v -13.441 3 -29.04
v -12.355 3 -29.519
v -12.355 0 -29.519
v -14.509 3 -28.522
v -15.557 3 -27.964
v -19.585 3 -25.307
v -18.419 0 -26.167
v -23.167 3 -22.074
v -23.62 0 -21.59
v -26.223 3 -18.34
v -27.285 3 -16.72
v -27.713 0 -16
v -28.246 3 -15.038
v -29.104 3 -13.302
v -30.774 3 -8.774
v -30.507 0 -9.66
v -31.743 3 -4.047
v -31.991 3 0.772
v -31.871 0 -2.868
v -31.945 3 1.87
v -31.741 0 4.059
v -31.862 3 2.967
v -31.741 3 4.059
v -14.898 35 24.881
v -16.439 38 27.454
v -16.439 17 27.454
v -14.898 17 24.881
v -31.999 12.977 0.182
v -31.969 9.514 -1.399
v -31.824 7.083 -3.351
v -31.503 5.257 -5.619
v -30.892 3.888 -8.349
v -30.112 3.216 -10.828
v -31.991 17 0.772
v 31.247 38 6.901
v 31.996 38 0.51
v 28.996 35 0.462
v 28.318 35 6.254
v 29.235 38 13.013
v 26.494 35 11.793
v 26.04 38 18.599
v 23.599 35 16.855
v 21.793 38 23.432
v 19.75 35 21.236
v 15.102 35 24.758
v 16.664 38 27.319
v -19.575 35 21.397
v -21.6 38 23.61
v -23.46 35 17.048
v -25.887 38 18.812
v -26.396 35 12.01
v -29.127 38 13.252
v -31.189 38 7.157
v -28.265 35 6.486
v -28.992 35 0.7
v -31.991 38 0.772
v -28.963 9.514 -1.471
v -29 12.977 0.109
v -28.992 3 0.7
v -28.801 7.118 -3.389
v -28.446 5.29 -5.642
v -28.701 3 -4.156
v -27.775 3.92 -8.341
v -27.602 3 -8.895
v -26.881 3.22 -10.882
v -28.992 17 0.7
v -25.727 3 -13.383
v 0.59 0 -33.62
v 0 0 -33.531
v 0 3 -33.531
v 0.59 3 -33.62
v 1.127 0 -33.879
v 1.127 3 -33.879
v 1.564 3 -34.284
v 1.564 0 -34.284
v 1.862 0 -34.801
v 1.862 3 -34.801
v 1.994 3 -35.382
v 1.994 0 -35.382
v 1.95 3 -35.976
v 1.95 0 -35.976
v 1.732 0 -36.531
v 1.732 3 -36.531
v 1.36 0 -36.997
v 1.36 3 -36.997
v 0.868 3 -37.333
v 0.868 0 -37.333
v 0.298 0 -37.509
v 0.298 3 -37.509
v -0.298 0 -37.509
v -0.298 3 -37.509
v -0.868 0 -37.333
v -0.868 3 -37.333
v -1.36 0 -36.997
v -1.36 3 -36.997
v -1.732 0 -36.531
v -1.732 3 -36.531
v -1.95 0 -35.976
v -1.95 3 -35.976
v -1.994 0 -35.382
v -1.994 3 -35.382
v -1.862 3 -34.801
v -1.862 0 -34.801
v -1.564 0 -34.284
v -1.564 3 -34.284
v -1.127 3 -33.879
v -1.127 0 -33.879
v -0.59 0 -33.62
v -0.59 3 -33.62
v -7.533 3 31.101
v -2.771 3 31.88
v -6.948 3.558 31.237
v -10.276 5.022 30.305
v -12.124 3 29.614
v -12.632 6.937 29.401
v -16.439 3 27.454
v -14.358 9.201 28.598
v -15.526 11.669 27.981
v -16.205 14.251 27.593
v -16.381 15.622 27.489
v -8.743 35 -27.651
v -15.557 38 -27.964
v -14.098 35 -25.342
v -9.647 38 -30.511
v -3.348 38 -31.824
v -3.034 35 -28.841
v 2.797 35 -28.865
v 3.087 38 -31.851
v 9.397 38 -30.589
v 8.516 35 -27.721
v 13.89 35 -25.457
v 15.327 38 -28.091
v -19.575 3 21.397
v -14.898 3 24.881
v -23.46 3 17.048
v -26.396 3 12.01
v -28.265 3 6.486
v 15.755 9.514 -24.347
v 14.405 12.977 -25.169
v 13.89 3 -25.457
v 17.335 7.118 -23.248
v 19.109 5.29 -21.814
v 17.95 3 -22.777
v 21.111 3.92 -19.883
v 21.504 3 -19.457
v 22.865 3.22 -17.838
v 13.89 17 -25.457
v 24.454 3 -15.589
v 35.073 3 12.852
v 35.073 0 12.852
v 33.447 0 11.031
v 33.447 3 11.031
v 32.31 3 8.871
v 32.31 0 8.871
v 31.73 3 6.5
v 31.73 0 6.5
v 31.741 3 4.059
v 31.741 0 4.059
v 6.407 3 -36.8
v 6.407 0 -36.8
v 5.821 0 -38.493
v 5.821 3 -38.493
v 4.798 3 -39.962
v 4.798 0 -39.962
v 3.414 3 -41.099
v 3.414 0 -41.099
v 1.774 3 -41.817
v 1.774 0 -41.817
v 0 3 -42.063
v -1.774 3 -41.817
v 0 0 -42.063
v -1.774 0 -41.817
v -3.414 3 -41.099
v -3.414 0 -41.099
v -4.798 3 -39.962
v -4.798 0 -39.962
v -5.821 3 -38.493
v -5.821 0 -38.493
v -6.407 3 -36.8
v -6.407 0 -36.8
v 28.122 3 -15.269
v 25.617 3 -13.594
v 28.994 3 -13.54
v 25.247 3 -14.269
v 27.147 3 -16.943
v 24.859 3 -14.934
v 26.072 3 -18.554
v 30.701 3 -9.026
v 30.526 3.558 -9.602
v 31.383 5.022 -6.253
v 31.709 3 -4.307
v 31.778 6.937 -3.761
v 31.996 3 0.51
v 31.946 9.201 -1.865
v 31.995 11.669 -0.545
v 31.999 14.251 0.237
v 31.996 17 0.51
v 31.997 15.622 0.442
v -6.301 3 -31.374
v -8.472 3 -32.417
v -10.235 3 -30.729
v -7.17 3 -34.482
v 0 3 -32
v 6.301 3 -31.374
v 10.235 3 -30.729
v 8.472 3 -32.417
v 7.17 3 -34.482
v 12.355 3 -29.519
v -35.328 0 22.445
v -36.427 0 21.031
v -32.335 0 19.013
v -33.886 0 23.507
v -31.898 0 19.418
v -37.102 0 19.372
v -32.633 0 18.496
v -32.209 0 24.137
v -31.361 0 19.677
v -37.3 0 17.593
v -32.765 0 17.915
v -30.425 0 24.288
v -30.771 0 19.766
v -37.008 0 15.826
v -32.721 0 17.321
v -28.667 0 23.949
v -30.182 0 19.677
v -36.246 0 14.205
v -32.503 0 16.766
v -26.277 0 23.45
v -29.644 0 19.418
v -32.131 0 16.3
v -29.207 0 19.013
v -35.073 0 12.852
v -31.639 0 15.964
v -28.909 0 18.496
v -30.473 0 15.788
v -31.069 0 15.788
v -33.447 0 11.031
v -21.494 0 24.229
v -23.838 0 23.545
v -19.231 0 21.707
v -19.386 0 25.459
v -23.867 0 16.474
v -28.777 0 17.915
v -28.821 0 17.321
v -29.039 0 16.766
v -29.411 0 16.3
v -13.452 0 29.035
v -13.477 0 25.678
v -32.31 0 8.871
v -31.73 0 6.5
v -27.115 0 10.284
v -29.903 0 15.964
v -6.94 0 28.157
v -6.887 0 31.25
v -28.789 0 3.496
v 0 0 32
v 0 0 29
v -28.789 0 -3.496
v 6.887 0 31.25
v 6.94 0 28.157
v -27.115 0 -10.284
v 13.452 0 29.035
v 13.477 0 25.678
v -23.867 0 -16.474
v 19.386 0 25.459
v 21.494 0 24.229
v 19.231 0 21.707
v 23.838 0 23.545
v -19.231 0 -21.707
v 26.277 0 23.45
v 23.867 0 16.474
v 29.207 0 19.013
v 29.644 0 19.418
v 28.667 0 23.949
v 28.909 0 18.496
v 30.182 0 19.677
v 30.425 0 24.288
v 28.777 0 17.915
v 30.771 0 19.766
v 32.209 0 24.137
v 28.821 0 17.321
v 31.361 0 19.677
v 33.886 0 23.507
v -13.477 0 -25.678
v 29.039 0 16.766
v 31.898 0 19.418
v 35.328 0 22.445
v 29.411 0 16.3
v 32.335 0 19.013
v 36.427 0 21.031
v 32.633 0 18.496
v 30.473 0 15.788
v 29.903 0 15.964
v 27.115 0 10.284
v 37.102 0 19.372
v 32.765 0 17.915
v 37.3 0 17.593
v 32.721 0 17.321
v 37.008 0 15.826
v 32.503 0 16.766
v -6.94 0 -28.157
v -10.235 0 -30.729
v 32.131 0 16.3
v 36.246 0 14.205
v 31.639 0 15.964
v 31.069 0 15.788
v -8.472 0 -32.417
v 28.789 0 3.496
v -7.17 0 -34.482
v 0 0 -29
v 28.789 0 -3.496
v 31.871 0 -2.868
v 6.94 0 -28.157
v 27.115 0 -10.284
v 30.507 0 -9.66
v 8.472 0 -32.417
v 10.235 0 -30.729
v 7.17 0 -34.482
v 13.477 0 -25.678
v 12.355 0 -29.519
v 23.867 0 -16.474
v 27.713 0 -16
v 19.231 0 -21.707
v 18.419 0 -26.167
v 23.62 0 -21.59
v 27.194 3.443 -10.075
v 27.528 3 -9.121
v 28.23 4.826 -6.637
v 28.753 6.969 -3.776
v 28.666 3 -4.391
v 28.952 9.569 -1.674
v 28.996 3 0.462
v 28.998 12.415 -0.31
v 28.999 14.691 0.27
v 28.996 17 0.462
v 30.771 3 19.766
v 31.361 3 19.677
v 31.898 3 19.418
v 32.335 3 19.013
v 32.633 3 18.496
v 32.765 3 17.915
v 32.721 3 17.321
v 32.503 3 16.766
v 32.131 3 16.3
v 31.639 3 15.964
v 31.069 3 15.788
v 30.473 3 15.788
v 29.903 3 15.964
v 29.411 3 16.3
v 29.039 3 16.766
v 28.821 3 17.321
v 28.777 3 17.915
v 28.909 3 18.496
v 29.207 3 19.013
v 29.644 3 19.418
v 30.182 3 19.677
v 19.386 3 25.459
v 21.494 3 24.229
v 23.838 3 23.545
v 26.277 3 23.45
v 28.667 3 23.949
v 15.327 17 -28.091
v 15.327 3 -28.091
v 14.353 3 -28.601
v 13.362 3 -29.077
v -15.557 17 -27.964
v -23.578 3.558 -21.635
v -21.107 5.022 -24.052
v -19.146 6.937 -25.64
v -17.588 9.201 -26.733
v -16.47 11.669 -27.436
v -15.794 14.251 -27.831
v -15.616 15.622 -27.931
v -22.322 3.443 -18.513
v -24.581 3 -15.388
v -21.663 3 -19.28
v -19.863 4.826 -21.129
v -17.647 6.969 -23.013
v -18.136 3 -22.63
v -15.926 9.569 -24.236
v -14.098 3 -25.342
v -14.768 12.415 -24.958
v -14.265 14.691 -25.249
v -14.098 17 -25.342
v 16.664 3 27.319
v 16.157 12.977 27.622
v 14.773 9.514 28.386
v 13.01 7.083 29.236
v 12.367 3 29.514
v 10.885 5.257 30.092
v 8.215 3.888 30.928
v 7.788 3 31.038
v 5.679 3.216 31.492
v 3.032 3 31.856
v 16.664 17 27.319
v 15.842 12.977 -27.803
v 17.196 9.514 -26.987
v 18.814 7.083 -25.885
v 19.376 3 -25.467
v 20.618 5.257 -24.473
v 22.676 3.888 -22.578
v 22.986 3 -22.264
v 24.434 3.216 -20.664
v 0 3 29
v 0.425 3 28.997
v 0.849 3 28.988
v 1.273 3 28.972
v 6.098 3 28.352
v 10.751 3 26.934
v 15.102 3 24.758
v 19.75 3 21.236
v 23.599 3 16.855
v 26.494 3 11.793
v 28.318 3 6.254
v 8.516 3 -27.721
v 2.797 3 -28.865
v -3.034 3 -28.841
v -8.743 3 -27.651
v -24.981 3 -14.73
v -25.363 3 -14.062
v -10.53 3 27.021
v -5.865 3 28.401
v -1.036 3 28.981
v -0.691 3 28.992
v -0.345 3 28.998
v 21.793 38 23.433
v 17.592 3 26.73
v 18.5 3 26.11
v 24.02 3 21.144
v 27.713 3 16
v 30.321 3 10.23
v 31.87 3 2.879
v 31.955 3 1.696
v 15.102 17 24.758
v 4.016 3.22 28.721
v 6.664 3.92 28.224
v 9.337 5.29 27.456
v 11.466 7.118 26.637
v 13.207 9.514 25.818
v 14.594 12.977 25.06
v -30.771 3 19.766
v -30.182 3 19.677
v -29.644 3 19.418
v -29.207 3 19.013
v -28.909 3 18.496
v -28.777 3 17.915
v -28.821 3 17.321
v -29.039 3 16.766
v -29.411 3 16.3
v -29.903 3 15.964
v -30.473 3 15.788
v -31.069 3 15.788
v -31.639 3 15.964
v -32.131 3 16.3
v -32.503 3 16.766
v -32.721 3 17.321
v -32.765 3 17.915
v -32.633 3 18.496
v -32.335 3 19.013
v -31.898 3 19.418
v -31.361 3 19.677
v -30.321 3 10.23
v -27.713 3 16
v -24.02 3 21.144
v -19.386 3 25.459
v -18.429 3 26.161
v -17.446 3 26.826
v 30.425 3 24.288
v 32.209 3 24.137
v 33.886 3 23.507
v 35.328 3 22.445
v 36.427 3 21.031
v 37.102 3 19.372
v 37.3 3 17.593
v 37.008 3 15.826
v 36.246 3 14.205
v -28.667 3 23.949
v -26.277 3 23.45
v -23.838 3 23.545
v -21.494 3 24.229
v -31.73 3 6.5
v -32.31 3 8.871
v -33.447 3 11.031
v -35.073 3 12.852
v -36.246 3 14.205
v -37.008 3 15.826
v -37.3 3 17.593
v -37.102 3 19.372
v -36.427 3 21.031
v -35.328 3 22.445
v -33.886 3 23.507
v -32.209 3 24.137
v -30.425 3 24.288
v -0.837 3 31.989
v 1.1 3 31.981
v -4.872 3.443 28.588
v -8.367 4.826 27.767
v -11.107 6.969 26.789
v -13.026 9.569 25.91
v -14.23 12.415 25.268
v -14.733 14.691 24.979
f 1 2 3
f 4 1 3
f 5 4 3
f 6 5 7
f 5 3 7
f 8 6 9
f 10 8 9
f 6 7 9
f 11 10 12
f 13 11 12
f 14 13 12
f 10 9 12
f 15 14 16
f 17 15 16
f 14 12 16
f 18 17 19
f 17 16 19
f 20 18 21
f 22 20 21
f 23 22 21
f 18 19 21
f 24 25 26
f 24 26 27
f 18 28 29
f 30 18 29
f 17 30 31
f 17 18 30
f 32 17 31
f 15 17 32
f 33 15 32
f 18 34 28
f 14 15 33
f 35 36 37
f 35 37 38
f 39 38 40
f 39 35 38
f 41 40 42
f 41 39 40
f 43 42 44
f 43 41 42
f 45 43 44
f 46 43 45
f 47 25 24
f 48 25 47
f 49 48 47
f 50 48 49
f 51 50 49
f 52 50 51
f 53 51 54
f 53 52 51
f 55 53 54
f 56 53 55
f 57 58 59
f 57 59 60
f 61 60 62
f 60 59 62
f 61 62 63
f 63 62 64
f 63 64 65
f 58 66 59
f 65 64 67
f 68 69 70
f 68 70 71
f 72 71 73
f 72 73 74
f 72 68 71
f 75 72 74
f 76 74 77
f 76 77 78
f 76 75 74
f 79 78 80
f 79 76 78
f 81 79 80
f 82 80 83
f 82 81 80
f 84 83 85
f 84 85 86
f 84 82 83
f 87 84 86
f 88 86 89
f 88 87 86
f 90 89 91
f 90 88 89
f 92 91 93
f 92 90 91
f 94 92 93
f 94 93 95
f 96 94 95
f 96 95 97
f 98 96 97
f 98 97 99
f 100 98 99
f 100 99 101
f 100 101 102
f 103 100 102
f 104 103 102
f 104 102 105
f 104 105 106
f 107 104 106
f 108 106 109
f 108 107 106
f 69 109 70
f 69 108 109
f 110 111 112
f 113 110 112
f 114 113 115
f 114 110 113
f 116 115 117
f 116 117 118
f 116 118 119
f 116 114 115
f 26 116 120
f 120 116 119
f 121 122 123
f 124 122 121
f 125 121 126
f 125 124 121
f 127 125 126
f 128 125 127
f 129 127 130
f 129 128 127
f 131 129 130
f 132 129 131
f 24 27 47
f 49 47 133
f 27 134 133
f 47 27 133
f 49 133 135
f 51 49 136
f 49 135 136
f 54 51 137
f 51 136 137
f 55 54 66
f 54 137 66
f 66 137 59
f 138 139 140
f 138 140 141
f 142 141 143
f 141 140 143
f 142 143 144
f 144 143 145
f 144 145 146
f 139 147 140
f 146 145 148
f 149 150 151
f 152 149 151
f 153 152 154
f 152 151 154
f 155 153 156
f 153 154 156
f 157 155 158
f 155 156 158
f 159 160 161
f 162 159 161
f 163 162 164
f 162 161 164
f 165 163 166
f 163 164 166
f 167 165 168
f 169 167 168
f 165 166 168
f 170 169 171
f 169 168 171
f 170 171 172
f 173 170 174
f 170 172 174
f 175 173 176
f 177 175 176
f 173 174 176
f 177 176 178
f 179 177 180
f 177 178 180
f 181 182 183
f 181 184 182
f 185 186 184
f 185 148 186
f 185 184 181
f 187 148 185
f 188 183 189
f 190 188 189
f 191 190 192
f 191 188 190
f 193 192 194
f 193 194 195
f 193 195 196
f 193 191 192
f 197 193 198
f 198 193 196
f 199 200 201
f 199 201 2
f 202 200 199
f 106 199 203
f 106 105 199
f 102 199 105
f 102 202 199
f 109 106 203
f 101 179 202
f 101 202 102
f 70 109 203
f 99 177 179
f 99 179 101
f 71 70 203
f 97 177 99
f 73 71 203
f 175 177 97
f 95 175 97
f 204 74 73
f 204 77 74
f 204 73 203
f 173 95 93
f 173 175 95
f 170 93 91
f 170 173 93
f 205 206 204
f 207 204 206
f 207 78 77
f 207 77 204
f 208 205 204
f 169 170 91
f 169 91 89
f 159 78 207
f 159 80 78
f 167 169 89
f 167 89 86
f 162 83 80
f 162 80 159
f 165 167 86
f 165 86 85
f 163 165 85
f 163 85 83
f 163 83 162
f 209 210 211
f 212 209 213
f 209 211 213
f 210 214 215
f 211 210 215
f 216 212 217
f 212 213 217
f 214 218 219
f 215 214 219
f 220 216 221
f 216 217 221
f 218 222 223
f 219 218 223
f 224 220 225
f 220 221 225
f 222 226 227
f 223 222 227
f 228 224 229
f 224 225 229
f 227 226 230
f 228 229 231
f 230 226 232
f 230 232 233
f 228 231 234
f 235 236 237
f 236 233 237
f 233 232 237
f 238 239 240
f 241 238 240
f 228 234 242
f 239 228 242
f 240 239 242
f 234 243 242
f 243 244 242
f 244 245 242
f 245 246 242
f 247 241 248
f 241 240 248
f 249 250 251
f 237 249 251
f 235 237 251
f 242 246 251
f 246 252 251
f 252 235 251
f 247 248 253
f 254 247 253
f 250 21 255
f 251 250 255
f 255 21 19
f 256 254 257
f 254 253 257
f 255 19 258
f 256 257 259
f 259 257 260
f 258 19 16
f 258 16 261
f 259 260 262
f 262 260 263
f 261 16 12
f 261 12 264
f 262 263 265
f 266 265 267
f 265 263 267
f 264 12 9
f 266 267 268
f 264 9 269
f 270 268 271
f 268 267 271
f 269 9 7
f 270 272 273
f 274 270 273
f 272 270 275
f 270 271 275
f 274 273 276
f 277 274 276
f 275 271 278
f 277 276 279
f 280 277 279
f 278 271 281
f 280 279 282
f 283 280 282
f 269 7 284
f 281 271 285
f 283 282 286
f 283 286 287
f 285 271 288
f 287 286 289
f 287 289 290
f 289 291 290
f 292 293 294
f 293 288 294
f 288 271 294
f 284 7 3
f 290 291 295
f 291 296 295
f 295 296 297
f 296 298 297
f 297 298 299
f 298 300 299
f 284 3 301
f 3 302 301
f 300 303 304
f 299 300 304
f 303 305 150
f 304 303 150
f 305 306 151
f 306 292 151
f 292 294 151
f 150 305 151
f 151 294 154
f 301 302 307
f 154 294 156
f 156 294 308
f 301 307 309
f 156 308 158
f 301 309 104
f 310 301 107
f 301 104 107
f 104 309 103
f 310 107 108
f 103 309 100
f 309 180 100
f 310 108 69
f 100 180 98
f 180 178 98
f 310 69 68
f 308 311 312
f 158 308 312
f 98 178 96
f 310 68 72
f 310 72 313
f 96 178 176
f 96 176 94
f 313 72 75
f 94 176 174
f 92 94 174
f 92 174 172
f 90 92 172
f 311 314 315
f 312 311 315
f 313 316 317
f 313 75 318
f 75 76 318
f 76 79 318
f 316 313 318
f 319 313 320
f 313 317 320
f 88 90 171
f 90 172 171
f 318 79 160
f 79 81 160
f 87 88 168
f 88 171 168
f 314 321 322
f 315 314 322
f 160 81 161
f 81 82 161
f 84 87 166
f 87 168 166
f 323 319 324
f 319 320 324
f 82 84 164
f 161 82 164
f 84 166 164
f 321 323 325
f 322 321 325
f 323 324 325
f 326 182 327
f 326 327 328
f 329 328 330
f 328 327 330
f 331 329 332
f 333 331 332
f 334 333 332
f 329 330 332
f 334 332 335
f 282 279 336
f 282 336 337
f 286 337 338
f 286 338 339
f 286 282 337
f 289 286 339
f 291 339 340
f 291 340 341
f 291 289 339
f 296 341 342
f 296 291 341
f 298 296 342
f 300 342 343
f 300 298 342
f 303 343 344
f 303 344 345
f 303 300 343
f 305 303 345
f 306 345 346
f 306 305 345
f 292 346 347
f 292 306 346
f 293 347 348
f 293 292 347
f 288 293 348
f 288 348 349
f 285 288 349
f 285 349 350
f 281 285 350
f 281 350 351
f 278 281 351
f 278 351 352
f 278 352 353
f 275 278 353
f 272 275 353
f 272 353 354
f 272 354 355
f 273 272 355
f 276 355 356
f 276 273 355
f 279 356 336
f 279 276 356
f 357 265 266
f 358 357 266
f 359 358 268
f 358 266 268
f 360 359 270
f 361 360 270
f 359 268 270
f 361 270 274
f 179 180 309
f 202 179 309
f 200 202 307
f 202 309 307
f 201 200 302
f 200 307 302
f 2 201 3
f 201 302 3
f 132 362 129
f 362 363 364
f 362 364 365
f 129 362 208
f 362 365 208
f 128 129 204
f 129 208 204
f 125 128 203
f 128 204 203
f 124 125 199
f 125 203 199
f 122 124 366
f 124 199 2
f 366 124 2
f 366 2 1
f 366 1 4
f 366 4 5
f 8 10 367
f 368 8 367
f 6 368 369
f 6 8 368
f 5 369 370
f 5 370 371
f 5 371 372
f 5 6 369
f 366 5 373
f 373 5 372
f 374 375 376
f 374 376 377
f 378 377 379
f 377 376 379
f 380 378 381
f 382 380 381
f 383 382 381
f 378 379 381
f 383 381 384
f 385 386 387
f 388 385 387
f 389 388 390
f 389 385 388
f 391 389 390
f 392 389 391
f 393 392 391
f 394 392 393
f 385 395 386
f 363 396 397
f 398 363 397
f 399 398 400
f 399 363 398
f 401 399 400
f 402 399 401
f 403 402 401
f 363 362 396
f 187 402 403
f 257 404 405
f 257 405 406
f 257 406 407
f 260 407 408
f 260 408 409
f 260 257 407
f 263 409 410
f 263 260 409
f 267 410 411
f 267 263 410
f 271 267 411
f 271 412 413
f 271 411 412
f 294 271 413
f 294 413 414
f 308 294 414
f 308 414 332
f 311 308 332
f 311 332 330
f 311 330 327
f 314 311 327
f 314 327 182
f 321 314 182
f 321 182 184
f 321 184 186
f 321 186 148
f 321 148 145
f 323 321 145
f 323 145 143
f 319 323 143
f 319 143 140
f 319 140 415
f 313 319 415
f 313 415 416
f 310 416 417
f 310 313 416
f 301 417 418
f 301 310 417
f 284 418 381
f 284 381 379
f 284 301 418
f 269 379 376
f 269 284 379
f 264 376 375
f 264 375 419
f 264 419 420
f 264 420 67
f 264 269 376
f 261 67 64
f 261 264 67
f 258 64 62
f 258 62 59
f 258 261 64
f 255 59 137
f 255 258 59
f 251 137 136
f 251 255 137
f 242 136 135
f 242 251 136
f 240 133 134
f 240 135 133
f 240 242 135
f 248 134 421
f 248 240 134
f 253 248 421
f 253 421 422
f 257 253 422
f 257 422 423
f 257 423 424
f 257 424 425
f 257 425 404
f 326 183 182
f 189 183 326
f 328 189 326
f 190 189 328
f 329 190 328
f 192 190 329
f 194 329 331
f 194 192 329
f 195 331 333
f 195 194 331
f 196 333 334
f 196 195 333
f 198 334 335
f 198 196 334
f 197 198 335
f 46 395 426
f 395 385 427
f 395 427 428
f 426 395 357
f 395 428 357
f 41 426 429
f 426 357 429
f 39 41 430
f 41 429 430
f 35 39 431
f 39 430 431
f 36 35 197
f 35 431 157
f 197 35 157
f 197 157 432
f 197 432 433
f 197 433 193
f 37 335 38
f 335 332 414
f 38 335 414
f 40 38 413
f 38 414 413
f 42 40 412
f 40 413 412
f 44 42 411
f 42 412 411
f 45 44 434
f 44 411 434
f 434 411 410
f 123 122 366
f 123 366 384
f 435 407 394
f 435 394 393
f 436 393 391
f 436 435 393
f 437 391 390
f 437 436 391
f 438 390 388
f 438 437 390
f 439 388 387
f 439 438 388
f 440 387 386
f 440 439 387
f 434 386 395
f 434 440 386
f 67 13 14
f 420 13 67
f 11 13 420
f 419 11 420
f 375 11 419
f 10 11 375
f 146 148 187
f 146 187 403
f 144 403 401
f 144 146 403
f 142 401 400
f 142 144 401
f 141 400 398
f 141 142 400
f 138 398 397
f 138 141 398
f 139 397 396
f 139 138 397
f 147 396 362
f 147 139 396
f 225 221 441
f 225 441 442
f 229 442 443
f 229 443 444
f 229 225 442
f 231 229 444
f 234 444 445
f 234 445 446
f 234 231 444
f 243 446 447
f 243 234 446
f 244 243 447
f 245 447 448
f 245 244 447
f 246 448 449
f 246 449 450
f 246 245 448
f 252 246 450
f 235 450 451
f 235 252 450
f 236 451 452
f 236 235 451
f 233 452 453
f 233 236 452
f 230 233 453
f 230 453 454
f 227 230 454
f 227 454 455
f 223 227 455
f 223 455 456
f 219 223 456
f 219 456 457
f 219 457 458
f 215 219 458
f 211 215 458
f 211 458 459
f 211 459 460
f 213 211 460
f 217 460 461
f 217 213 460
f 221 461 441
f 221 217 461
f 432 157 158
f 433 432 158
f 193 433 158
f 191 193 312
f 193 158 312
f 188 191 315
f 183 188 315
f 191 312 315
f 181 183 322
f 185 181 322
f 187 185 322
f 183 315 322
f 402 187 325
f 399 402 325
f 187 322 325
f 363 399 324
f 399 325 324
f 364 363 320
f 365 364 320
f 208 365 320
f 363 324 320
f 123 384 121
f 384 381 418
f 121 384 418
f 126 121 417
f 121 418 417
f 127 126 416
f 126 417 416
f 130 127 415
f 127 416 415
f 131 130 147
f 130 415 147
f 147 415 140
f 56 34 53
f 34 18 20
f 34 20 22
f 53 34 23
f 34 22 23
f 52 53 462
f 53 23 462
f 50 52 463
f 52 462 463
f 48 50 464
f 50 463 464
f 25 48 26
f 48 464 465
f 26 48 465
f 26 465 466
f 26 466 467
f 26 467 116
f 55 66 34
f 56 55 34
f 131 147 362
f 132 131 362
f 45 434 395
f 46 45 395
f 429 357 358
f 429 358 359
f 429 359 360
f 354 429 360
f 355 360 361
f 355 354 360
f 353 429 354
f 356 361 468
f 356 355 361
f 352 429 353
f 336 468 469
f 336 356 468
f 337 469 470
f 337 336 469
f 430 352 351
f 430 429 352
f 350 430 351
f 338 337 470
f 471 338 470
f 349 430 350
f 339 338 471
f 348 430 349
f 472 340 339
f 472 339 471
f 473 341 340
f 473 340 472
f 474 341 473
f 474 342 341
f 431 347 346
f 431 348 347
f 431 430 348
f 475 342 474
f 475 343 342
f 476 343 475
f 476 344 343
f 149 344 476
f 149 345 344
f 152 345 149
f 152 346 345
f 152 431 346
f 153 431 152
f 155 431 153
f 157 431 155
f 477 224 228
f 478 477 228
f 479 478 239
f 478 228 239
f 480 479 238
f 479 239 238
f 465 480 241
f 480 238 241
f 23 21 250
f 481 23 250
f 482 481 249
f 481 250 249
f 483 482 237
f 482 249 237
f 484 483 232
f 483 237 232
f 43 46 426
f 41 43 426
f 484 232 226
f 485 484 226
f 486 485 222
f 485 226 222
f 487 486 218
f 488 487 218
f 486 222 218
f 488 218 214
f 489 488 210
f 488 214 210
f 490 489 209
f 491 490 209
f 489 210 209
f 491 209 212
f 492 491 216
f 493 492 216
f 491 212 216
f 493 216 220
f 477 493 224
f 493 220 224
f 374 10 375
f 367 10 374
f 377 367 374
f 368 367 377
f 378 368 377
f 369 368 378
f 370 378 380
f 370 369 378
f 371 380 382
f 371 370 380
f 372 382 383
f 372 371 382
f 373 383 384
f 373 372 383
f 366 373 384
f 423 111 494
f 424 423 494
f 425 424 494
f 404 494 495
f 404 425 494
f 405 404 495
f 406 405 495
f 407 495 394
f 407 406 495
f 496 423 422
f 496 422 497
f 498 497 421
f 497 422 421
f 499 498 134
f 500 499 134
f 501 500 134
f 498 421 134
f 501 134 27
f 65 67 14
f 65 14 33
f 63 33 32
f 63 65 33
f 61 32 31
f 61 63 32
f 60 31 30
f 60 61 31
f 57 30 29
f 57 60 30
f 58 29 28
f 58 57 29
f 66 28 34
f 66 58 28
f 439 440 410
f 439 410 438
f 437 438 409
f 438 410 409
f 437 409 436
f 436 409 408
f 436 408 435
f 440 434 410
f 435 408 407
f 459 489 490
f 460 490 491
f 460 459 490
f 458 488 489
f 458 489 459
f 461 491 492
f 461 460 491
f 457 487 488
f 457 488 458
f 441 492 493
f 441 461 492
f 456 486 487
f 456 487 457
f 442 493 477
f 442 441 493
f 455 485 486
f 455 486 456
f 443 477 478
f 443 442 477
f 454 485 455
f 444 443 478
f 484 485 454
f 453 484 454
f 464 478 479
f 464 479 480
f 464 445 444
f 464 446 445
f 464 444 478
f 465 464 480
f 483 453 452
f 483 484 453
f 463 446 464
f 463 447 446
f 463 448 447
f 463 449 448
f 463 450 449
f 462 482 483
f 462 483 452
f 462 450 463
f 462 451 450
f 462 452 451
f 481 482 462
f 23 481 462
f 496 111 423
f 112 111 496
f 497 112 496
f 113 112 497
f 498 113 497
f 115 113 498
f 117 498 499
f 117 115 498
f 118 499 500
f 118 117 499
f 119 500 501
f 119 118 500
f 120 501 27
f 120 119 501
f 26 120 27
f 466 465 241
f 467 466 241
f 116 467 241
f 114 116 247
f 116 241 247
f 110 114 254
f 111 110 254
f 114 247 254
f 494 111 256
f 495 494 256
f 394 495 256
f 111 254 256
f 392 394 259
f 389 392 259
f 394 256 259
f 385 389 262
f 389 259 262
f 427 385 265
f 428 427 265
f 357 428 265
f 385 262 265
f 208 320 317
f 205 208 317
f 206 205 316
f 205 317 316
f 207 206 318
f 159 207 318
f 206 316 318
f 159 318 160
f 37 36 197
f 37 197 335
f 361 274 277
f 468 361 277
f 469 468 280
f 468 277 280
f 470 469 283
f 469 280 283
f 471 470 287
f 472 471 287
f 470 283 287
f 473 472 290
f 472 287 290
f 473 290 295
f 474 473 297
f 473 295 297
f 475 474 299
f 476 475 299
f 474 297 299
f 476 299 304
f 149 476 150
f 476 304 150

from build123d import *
from build123d.topology import SkipClean

# Parameters (mm, degrees)
SKETCH1_R           = 29
SKETCH1_R_2         = 2.0000000000000013
SKETCH1_R_3         = 2.00000000000017
SKETCH1_R_4         = 2.0000000000003304
BOSS_EXTRUDE1_DEPTH = 3
BOSS_EXTRUDE2_DEPTH = 35
FILLET1_R           = 14
CHAMFER1_SIZE       = 3


# Some blends are built 0.0001 mm under size
with BuildPart() as part:
    # Sketch1 → Boss-Extrude1 (new body)
    with BuildSketch(Plane(origin=(0, 0, 0), x_dir=(1, 0, 0), z_dir=(0, 1, 0))):
        with BuildLine():
            ThreePointArc((-12.355312859352809, 29.51857456157921), (-27.71281292110204, 15.999999999999998), (-31.741491883509095, -4.0592724728855325))
            ThreePointArc((-31.741491883509095, -4.0592724728855325), (-32.309645144827726, -8.871468590740253), (-35.073430755727436, -12.851609128714605))
            ThreePointArc((-35.073430755727436, -12.851609128714605), (-36.427364069331304, -21.031348451296957), (-28.666535362838538, -23.948677467977124))
            ThreePointArc((-28.666535362838538, -23.948677467977124), (-23.83773974087064, -23.54523918731126), (-19.38617902415628, -25.4593020886937))
            ThreePointArc((-19.38617902415628, -25.4593020886937), (1.617e-14, -32.00000000000001), (19.386179024156295, -25.45930208869368))
            ThreePointArc((19.386179024156295, -25.45930208869368), (23.837739740870653, -23.54523918731124), (28.666535362838555, -23.948677467977113))
            ThreePointArc((28.666535362838555, -23.948677467977113), (36.427364069331325, -21.031348451296928), (35.07343075572746, -12.851609128714571))
            ThreePointArc((35.07343075572746, -12.851609128714571), (32.30964514482773, -8.87146859074023), (31.741491883509102, -4.059272472885512))
            ThreePointArc((31.741491883509102, -4.059272472885512), (27.712812921102042, 16.000000000000007), (12.355312859352809, 29.518574561579204))
            ThreePointArc((12.355312859352809, 29.518574561579204), (8.47190540395708, 32.41670777805148), (6.4068953928889005, 36.8002865966917))
            ThreePointArc((6.4068953928889005, 36.8002865966917), (4.75e-15, 42.06269690259387), (-6.406895392888902, 36.800286596691706))
            ThreePointArc((-6.406895392888902, 36.800286596691706), (-8.471905403957084, 32.41670777805149), (-12.355312859352809, 29.51857456157921))
        make_face()
        with Locations(Location((0, 0, 0), (0, 0, 270))):
            Circle(SKETCH1_R, mode=Mode.SUBTRACT)
        with Locations(Location((0, 35.53134845129693, 0), (0, 0, 270))):
            Circle(SKETCH1_R_2, mode=Mode.SUBTRACT)
        with Locations(Location((30.771050389540026, -17.76567422564846, 0), (0, 0, 270))):
            Circle(SKETCH1_R_3, mode=Mode.SUBTRACT)
        with Locations(Location((-30.771050389540008, -17.765674225648485, 0), (0, 0, 270))):
            Circle(SKETCH1_R_4, mode=Mode.SUBTRACT)
    extrude(amount=BOSS_EXTRUDE1_DEPTH)

    # Sketch2 → Boss-Extrude2 (add)
    with SkipClean():  # the faces are left unmerged after this step: merging them gives an invalid solid
        with BuildSketch(Plane(origin=(0, 3, 0), x_dir=(1, 0, 0), z_dir=(0, 1, 0))):
            with BuildLine():
                Line((-15.556616883168559, 27.964113988294258), (-14.098184050372366, 25.34247830189322))
                ThreePointArc((-14.098184050372366, 25.34247830189322), (-0.11887275101926295, 28.999756365686377), (13.88995133460985, 25.457204322593487))
                Line((13.88995133460985, 25.457204322593487), (15.326842851982352, 28.09070821803249))
                ThreePointArc((15.326842851982352, 28.09070821803249), (-0.13116993215917874, 31.99973116213475), (-15.556616883168559, 27.964113988294258))
            make_face()
            with BuildLine():
                Line((-28.991561320001907, -0.699551448195039), (-31.990688353103597, -0.7719188393875828))
                ThreePointArc((-31.990688353103597, -0.7719188393875828), (-27.646995134601628, -16.1134620745299), (-16.439324666602317, -27.454482411913002))
                Line((-16.439324666602317, -27.454482411913002), (-14.898137979109256, -24.88062468579768))
                ThreePointArc((-14.898137979109256, -24.88062468579768), (-25.055089340734252, -14.602825005043623), (-28.991561320001907, -0.699551448195039))
            make_face()
            with BuildLine():
                Line((31.995941549770887, -0.5096315763812559), (28.996322029481636, -0.46185361609554243))
                ThreePointArc((28.996322029481636, -0.46185361609554243), (25.173962091753527, -14.396931360642762), (15.101609985392061, -24.757652874398442))
                Line((15.101609985392061, -24.757652874398442), (16.663845501121262, -27.318789378644897))
                ThreePointArc((16.663845501121262, -27.318789378644897), (27.778165066760824, -15.88626908760484), (31.995941549770887, -0.5096315763812559))
            make_face()
        extrude(amount=BOSS_EXTRUDE2_DEPTH)

    # Fillet1
    # the kernel refuses this fillet: 14 mm, written as the material it adds along each edge
    with BuildSketch(Plane(origin=(-32.57166659913419, 3, -58.5498636629911), x_dir=(0, 1, 0), z_dir=(0.486144277599018, 0, 0.8738785621341955))) as fillet1_piece_1_section:
        with BuildLine():
            CenterArc((FILLET1_R, FILLET1_R), FILLET1_R, 180.00000000000003, 90)
            Line((0, FILLET1_R), (0, 0))
            Line((0, 0), (FILLET1_R, 0))
        make_face()
    fillet1_piece_1 = extrude(amount=72.99999999999824, mode=Mode.PRIVATE)
    fillet1_piece_1 = fillet1_piece_1 & Plane(origin=(1.377e-14, 6.144013210194413, -4.086e-14), x_dir=(0.4789638391244486, 0, -0.877834631813515), z_dir=(0, -1, 0)) * Cylinder(31.99999999999996, 202, mode=Mode.PRIVATE)
    fillet1_piece_1 = fillet1_piece_1 - Plane(origin=(0, 6.144013210194413, 0), x_dir=(-1.8e-16, 0, 1), z_dir=(0, -1, 0)) * Cylinder(29, 202, mode=Mode.PRIVATE)
    add(fillet1_piece_1)
    with BuildSketch(Plane(origin=(-2.8737830347458213, 3, 5.267007790879544), x_dir=(0.8778346318135153, 0, 0.4789638391244479), z_dir=(0.4789638391244479, 0, -0.8778346318135153))) as fillet1_piece_2_section:
        with BuildLine():
            CenterArc((FILLET1_R, -FILLET1_R), FILLET1_R, 90, 90)
            Line((-2.37e-15, -FILLET1_R), (0, 0))
            Line((0, 0), (FILLET1_R, 0))
        make_face()
    fillet1_piece_2 = extrude(amount=72.99999999999824, mode=Mode.PRIVATE)
    fillet1_piece_2 = fillet1_piece_2 & Plane(origin=(5.151e-14, 6.1440139073006, -2.487e-14), x_dir=(0.9919216213596592, 0, 0.12685226477767322), z_dir=(0, -1, 0)) * Cylinder(31.999999999999954, 202, mode=Mode.PRIVATE)
    fillet1_piece_2 = fillet1_piece_2 - Plane(origin=(0, 6.1440139073006, 0), x_dir=(-1.8e-16, 0, 1), z_dir=(0, -1, 0)) * Cylinder(29, 202, mode=Mode.PRIVATE)
    add(fillet1_piece_2)
    with BuildSketch(Plane(origin=(66.99150261983281, 3, 1.0670411130482422), x_dir=(0.015925986761913882, 0, -0.9998731734303402), z_dir=(-0.9998731734303404, 0, -0.015925986761913886))) as fillet1_piece_3_section:
        with BuildLine():
            CenterArc((FILLET1_R, -FILLET1_R), FILLET1_R, 90, 90)
            Line((0, -FILLET1_R), (0, 0))
            Line((0, 0), (FILLET1_R, 0))
        make_face()
    fillet1_piece_3 = extrude(amount=72.99999999999828, mode=Mode.PRIVATE)
    fillet1_piece_3 = fillet1_piece_3 & Plane(origin=(5.151e-14, 6.144014691753946, -2.487e-14), x_dir=(0.9919216213596592, 0, 0.12685226477767322), z_dir=(0, -1, 0)) * Cylinder(31.999999999999954, 202, mode=Mode.PRIVATE)
    fillet1_piece_3 = fillet1_piece_3 - Plane(origin=(0, 6.144014691753946, 0), x_dir=(-1.8e-16, 0, 1), z_dir=(0, -1, 0)) * Cylinder(29, 202, mode=Mode.PRIVATE)
    add(fillet1_piece_3)
    with BuildSketch(Plane(origin=(-3.124471031459313, 3, -5.122273008494407), x_dir=(0, 1, 0), z_dir=(0.5207451719100392, 0, 0.8537121680826528))) as fillet1_piece_4_section:
        with BuildLine():
            CenterArc((FILLET1_R, FILLET1_R), FILLET1_R, 180, 90)
            Line((0, FILLET1_R), (0, 0))
            Line((0, 0), (FILLET1_R, 0))
        make_face()
    fillet1_piece_4 = extrude(amount=72.99999999999824, mode=Mode.PRIVATE)
    fillet1_piece_4 = fillet1_piece_4 & Plane(origin=(1.066e-14, 6.144012485408136, 2.132e-14), x_dir=(0.5207451719100394, 0, 0.8537121680826528), z_dir=(0, -1, 0)) * Cylinder(31.999999999999986, 202, mode=Mode.PRIVATE)
    fillet1_piece_4 = fillet1_piece_4 - Plane(origin=(0, 6.144012485408136, 0), x_dir=(-1.8e-16, 0, 1), z_dir=(0, -1, 0)) * Cylinder(29, 202, mode=Mode.PRIVATE)
    add(fillet1_piece_4)
    with BuildSketch(Plane(origin=(5.998254066205156, 3, -0.1447347823851374), x_dir=(-0.024122463730862184, 0, -0.9997090110344876), z_dir=(-0.9997090110344876, 0, 0.024122463730862184))) as fillet1_piece_5_section:
        with BuildLine():
            CenterArc((FILLET1_R, -FILLET1_R), FILLET1_R, 90, 90)
            Line((-1.64e-15, -FILLET1_R), (0, 0))
            Line((0, 0), (FILLET1_R, 0))
        make_face()
    fillet1_piece_5 = extrude(amount=72.99999999999821, mode=Mode.PRIVATE)
    fillet1_piece_5 = fillet1_piece_5 & Plane(origin=(-8.88e-15, 6.144013907117808, -9.33e-15), x_dir=(-0.3861035268547751, 0, -0.9224554550493503), z_dir=(0, -1, 0)) * Cylinder(31.999999999999986, 202, mode=Mode.PRIVATE)
    fillet1_piece_5 = fillet1_piece_5 - Plane(origin=(0, 6.144013907117808, 0), x_dir=(-1.8e-16, 0, 1), z_dir=(0, -1, 0)) * Cylinder(29, 202, mode=Mode.PRIVATE)
    add(fillet1_piece_5)
    with BuildSketch(Plane(origin=(-34.41983602069866, 3, 57.48282254994282), x_dir=(0.8579525753722805, 0, 0.513728895831324), z_dir=(0.513728895831324, 0, -0.8579525753722805))) as fillet1_piece_6_section:
        with BuildLine():
            CenterArc((FILLET1_R, -FILLET1_R), FILLET1_R, 90, 90)
            Line((3.65e-15, -FILLET1_R), (0, 0))
            Line((0, 0), (FILLET1_R, 0))
        make_face()
    fillet1_piece_6 = extrude(amount=72.99999999999822, mode=Mode.PRIVATE)
    fillet1_piece_6 = fillet1_piece_6 & Plane(origin=(-7.99e-15, 6.144014691708705, 8.88e-15), x_dir=(-0.6058180945048837, 0, 0.795603190271678), z_dir=(0, -1, 0)) * Cylinder(31.999999999999996, 202, mode=Mode.PRIVATE)
    fillet1_piece_6 = fillet1_piece_6 - Plane(origin=(0, 6.144014691708705, 0), x_dir=(-1.8e-16, 0, 1), z_dir=(0, -1, 0)) * Cylinder(29, 202, mode=Mode.PRIVATE)
    add(fillet1_piece_6)

    # Chamfer1
    chamfer1_edges = [part.edges().sort_by_distance(p)[0] for p in [
        (-0.1188727510192642, 38, -28.999756365686377),
        (25.173962091753527, 38, 14.39693136064276),
        (-25.055089340734256, 38, 14.60282500504362),
    ]]
    chamfer(chamfer1_edges, length=CHAMFER1_SIZE - 0.0001)  # a hair under: the kernel refuses the full size


solid = part.part
